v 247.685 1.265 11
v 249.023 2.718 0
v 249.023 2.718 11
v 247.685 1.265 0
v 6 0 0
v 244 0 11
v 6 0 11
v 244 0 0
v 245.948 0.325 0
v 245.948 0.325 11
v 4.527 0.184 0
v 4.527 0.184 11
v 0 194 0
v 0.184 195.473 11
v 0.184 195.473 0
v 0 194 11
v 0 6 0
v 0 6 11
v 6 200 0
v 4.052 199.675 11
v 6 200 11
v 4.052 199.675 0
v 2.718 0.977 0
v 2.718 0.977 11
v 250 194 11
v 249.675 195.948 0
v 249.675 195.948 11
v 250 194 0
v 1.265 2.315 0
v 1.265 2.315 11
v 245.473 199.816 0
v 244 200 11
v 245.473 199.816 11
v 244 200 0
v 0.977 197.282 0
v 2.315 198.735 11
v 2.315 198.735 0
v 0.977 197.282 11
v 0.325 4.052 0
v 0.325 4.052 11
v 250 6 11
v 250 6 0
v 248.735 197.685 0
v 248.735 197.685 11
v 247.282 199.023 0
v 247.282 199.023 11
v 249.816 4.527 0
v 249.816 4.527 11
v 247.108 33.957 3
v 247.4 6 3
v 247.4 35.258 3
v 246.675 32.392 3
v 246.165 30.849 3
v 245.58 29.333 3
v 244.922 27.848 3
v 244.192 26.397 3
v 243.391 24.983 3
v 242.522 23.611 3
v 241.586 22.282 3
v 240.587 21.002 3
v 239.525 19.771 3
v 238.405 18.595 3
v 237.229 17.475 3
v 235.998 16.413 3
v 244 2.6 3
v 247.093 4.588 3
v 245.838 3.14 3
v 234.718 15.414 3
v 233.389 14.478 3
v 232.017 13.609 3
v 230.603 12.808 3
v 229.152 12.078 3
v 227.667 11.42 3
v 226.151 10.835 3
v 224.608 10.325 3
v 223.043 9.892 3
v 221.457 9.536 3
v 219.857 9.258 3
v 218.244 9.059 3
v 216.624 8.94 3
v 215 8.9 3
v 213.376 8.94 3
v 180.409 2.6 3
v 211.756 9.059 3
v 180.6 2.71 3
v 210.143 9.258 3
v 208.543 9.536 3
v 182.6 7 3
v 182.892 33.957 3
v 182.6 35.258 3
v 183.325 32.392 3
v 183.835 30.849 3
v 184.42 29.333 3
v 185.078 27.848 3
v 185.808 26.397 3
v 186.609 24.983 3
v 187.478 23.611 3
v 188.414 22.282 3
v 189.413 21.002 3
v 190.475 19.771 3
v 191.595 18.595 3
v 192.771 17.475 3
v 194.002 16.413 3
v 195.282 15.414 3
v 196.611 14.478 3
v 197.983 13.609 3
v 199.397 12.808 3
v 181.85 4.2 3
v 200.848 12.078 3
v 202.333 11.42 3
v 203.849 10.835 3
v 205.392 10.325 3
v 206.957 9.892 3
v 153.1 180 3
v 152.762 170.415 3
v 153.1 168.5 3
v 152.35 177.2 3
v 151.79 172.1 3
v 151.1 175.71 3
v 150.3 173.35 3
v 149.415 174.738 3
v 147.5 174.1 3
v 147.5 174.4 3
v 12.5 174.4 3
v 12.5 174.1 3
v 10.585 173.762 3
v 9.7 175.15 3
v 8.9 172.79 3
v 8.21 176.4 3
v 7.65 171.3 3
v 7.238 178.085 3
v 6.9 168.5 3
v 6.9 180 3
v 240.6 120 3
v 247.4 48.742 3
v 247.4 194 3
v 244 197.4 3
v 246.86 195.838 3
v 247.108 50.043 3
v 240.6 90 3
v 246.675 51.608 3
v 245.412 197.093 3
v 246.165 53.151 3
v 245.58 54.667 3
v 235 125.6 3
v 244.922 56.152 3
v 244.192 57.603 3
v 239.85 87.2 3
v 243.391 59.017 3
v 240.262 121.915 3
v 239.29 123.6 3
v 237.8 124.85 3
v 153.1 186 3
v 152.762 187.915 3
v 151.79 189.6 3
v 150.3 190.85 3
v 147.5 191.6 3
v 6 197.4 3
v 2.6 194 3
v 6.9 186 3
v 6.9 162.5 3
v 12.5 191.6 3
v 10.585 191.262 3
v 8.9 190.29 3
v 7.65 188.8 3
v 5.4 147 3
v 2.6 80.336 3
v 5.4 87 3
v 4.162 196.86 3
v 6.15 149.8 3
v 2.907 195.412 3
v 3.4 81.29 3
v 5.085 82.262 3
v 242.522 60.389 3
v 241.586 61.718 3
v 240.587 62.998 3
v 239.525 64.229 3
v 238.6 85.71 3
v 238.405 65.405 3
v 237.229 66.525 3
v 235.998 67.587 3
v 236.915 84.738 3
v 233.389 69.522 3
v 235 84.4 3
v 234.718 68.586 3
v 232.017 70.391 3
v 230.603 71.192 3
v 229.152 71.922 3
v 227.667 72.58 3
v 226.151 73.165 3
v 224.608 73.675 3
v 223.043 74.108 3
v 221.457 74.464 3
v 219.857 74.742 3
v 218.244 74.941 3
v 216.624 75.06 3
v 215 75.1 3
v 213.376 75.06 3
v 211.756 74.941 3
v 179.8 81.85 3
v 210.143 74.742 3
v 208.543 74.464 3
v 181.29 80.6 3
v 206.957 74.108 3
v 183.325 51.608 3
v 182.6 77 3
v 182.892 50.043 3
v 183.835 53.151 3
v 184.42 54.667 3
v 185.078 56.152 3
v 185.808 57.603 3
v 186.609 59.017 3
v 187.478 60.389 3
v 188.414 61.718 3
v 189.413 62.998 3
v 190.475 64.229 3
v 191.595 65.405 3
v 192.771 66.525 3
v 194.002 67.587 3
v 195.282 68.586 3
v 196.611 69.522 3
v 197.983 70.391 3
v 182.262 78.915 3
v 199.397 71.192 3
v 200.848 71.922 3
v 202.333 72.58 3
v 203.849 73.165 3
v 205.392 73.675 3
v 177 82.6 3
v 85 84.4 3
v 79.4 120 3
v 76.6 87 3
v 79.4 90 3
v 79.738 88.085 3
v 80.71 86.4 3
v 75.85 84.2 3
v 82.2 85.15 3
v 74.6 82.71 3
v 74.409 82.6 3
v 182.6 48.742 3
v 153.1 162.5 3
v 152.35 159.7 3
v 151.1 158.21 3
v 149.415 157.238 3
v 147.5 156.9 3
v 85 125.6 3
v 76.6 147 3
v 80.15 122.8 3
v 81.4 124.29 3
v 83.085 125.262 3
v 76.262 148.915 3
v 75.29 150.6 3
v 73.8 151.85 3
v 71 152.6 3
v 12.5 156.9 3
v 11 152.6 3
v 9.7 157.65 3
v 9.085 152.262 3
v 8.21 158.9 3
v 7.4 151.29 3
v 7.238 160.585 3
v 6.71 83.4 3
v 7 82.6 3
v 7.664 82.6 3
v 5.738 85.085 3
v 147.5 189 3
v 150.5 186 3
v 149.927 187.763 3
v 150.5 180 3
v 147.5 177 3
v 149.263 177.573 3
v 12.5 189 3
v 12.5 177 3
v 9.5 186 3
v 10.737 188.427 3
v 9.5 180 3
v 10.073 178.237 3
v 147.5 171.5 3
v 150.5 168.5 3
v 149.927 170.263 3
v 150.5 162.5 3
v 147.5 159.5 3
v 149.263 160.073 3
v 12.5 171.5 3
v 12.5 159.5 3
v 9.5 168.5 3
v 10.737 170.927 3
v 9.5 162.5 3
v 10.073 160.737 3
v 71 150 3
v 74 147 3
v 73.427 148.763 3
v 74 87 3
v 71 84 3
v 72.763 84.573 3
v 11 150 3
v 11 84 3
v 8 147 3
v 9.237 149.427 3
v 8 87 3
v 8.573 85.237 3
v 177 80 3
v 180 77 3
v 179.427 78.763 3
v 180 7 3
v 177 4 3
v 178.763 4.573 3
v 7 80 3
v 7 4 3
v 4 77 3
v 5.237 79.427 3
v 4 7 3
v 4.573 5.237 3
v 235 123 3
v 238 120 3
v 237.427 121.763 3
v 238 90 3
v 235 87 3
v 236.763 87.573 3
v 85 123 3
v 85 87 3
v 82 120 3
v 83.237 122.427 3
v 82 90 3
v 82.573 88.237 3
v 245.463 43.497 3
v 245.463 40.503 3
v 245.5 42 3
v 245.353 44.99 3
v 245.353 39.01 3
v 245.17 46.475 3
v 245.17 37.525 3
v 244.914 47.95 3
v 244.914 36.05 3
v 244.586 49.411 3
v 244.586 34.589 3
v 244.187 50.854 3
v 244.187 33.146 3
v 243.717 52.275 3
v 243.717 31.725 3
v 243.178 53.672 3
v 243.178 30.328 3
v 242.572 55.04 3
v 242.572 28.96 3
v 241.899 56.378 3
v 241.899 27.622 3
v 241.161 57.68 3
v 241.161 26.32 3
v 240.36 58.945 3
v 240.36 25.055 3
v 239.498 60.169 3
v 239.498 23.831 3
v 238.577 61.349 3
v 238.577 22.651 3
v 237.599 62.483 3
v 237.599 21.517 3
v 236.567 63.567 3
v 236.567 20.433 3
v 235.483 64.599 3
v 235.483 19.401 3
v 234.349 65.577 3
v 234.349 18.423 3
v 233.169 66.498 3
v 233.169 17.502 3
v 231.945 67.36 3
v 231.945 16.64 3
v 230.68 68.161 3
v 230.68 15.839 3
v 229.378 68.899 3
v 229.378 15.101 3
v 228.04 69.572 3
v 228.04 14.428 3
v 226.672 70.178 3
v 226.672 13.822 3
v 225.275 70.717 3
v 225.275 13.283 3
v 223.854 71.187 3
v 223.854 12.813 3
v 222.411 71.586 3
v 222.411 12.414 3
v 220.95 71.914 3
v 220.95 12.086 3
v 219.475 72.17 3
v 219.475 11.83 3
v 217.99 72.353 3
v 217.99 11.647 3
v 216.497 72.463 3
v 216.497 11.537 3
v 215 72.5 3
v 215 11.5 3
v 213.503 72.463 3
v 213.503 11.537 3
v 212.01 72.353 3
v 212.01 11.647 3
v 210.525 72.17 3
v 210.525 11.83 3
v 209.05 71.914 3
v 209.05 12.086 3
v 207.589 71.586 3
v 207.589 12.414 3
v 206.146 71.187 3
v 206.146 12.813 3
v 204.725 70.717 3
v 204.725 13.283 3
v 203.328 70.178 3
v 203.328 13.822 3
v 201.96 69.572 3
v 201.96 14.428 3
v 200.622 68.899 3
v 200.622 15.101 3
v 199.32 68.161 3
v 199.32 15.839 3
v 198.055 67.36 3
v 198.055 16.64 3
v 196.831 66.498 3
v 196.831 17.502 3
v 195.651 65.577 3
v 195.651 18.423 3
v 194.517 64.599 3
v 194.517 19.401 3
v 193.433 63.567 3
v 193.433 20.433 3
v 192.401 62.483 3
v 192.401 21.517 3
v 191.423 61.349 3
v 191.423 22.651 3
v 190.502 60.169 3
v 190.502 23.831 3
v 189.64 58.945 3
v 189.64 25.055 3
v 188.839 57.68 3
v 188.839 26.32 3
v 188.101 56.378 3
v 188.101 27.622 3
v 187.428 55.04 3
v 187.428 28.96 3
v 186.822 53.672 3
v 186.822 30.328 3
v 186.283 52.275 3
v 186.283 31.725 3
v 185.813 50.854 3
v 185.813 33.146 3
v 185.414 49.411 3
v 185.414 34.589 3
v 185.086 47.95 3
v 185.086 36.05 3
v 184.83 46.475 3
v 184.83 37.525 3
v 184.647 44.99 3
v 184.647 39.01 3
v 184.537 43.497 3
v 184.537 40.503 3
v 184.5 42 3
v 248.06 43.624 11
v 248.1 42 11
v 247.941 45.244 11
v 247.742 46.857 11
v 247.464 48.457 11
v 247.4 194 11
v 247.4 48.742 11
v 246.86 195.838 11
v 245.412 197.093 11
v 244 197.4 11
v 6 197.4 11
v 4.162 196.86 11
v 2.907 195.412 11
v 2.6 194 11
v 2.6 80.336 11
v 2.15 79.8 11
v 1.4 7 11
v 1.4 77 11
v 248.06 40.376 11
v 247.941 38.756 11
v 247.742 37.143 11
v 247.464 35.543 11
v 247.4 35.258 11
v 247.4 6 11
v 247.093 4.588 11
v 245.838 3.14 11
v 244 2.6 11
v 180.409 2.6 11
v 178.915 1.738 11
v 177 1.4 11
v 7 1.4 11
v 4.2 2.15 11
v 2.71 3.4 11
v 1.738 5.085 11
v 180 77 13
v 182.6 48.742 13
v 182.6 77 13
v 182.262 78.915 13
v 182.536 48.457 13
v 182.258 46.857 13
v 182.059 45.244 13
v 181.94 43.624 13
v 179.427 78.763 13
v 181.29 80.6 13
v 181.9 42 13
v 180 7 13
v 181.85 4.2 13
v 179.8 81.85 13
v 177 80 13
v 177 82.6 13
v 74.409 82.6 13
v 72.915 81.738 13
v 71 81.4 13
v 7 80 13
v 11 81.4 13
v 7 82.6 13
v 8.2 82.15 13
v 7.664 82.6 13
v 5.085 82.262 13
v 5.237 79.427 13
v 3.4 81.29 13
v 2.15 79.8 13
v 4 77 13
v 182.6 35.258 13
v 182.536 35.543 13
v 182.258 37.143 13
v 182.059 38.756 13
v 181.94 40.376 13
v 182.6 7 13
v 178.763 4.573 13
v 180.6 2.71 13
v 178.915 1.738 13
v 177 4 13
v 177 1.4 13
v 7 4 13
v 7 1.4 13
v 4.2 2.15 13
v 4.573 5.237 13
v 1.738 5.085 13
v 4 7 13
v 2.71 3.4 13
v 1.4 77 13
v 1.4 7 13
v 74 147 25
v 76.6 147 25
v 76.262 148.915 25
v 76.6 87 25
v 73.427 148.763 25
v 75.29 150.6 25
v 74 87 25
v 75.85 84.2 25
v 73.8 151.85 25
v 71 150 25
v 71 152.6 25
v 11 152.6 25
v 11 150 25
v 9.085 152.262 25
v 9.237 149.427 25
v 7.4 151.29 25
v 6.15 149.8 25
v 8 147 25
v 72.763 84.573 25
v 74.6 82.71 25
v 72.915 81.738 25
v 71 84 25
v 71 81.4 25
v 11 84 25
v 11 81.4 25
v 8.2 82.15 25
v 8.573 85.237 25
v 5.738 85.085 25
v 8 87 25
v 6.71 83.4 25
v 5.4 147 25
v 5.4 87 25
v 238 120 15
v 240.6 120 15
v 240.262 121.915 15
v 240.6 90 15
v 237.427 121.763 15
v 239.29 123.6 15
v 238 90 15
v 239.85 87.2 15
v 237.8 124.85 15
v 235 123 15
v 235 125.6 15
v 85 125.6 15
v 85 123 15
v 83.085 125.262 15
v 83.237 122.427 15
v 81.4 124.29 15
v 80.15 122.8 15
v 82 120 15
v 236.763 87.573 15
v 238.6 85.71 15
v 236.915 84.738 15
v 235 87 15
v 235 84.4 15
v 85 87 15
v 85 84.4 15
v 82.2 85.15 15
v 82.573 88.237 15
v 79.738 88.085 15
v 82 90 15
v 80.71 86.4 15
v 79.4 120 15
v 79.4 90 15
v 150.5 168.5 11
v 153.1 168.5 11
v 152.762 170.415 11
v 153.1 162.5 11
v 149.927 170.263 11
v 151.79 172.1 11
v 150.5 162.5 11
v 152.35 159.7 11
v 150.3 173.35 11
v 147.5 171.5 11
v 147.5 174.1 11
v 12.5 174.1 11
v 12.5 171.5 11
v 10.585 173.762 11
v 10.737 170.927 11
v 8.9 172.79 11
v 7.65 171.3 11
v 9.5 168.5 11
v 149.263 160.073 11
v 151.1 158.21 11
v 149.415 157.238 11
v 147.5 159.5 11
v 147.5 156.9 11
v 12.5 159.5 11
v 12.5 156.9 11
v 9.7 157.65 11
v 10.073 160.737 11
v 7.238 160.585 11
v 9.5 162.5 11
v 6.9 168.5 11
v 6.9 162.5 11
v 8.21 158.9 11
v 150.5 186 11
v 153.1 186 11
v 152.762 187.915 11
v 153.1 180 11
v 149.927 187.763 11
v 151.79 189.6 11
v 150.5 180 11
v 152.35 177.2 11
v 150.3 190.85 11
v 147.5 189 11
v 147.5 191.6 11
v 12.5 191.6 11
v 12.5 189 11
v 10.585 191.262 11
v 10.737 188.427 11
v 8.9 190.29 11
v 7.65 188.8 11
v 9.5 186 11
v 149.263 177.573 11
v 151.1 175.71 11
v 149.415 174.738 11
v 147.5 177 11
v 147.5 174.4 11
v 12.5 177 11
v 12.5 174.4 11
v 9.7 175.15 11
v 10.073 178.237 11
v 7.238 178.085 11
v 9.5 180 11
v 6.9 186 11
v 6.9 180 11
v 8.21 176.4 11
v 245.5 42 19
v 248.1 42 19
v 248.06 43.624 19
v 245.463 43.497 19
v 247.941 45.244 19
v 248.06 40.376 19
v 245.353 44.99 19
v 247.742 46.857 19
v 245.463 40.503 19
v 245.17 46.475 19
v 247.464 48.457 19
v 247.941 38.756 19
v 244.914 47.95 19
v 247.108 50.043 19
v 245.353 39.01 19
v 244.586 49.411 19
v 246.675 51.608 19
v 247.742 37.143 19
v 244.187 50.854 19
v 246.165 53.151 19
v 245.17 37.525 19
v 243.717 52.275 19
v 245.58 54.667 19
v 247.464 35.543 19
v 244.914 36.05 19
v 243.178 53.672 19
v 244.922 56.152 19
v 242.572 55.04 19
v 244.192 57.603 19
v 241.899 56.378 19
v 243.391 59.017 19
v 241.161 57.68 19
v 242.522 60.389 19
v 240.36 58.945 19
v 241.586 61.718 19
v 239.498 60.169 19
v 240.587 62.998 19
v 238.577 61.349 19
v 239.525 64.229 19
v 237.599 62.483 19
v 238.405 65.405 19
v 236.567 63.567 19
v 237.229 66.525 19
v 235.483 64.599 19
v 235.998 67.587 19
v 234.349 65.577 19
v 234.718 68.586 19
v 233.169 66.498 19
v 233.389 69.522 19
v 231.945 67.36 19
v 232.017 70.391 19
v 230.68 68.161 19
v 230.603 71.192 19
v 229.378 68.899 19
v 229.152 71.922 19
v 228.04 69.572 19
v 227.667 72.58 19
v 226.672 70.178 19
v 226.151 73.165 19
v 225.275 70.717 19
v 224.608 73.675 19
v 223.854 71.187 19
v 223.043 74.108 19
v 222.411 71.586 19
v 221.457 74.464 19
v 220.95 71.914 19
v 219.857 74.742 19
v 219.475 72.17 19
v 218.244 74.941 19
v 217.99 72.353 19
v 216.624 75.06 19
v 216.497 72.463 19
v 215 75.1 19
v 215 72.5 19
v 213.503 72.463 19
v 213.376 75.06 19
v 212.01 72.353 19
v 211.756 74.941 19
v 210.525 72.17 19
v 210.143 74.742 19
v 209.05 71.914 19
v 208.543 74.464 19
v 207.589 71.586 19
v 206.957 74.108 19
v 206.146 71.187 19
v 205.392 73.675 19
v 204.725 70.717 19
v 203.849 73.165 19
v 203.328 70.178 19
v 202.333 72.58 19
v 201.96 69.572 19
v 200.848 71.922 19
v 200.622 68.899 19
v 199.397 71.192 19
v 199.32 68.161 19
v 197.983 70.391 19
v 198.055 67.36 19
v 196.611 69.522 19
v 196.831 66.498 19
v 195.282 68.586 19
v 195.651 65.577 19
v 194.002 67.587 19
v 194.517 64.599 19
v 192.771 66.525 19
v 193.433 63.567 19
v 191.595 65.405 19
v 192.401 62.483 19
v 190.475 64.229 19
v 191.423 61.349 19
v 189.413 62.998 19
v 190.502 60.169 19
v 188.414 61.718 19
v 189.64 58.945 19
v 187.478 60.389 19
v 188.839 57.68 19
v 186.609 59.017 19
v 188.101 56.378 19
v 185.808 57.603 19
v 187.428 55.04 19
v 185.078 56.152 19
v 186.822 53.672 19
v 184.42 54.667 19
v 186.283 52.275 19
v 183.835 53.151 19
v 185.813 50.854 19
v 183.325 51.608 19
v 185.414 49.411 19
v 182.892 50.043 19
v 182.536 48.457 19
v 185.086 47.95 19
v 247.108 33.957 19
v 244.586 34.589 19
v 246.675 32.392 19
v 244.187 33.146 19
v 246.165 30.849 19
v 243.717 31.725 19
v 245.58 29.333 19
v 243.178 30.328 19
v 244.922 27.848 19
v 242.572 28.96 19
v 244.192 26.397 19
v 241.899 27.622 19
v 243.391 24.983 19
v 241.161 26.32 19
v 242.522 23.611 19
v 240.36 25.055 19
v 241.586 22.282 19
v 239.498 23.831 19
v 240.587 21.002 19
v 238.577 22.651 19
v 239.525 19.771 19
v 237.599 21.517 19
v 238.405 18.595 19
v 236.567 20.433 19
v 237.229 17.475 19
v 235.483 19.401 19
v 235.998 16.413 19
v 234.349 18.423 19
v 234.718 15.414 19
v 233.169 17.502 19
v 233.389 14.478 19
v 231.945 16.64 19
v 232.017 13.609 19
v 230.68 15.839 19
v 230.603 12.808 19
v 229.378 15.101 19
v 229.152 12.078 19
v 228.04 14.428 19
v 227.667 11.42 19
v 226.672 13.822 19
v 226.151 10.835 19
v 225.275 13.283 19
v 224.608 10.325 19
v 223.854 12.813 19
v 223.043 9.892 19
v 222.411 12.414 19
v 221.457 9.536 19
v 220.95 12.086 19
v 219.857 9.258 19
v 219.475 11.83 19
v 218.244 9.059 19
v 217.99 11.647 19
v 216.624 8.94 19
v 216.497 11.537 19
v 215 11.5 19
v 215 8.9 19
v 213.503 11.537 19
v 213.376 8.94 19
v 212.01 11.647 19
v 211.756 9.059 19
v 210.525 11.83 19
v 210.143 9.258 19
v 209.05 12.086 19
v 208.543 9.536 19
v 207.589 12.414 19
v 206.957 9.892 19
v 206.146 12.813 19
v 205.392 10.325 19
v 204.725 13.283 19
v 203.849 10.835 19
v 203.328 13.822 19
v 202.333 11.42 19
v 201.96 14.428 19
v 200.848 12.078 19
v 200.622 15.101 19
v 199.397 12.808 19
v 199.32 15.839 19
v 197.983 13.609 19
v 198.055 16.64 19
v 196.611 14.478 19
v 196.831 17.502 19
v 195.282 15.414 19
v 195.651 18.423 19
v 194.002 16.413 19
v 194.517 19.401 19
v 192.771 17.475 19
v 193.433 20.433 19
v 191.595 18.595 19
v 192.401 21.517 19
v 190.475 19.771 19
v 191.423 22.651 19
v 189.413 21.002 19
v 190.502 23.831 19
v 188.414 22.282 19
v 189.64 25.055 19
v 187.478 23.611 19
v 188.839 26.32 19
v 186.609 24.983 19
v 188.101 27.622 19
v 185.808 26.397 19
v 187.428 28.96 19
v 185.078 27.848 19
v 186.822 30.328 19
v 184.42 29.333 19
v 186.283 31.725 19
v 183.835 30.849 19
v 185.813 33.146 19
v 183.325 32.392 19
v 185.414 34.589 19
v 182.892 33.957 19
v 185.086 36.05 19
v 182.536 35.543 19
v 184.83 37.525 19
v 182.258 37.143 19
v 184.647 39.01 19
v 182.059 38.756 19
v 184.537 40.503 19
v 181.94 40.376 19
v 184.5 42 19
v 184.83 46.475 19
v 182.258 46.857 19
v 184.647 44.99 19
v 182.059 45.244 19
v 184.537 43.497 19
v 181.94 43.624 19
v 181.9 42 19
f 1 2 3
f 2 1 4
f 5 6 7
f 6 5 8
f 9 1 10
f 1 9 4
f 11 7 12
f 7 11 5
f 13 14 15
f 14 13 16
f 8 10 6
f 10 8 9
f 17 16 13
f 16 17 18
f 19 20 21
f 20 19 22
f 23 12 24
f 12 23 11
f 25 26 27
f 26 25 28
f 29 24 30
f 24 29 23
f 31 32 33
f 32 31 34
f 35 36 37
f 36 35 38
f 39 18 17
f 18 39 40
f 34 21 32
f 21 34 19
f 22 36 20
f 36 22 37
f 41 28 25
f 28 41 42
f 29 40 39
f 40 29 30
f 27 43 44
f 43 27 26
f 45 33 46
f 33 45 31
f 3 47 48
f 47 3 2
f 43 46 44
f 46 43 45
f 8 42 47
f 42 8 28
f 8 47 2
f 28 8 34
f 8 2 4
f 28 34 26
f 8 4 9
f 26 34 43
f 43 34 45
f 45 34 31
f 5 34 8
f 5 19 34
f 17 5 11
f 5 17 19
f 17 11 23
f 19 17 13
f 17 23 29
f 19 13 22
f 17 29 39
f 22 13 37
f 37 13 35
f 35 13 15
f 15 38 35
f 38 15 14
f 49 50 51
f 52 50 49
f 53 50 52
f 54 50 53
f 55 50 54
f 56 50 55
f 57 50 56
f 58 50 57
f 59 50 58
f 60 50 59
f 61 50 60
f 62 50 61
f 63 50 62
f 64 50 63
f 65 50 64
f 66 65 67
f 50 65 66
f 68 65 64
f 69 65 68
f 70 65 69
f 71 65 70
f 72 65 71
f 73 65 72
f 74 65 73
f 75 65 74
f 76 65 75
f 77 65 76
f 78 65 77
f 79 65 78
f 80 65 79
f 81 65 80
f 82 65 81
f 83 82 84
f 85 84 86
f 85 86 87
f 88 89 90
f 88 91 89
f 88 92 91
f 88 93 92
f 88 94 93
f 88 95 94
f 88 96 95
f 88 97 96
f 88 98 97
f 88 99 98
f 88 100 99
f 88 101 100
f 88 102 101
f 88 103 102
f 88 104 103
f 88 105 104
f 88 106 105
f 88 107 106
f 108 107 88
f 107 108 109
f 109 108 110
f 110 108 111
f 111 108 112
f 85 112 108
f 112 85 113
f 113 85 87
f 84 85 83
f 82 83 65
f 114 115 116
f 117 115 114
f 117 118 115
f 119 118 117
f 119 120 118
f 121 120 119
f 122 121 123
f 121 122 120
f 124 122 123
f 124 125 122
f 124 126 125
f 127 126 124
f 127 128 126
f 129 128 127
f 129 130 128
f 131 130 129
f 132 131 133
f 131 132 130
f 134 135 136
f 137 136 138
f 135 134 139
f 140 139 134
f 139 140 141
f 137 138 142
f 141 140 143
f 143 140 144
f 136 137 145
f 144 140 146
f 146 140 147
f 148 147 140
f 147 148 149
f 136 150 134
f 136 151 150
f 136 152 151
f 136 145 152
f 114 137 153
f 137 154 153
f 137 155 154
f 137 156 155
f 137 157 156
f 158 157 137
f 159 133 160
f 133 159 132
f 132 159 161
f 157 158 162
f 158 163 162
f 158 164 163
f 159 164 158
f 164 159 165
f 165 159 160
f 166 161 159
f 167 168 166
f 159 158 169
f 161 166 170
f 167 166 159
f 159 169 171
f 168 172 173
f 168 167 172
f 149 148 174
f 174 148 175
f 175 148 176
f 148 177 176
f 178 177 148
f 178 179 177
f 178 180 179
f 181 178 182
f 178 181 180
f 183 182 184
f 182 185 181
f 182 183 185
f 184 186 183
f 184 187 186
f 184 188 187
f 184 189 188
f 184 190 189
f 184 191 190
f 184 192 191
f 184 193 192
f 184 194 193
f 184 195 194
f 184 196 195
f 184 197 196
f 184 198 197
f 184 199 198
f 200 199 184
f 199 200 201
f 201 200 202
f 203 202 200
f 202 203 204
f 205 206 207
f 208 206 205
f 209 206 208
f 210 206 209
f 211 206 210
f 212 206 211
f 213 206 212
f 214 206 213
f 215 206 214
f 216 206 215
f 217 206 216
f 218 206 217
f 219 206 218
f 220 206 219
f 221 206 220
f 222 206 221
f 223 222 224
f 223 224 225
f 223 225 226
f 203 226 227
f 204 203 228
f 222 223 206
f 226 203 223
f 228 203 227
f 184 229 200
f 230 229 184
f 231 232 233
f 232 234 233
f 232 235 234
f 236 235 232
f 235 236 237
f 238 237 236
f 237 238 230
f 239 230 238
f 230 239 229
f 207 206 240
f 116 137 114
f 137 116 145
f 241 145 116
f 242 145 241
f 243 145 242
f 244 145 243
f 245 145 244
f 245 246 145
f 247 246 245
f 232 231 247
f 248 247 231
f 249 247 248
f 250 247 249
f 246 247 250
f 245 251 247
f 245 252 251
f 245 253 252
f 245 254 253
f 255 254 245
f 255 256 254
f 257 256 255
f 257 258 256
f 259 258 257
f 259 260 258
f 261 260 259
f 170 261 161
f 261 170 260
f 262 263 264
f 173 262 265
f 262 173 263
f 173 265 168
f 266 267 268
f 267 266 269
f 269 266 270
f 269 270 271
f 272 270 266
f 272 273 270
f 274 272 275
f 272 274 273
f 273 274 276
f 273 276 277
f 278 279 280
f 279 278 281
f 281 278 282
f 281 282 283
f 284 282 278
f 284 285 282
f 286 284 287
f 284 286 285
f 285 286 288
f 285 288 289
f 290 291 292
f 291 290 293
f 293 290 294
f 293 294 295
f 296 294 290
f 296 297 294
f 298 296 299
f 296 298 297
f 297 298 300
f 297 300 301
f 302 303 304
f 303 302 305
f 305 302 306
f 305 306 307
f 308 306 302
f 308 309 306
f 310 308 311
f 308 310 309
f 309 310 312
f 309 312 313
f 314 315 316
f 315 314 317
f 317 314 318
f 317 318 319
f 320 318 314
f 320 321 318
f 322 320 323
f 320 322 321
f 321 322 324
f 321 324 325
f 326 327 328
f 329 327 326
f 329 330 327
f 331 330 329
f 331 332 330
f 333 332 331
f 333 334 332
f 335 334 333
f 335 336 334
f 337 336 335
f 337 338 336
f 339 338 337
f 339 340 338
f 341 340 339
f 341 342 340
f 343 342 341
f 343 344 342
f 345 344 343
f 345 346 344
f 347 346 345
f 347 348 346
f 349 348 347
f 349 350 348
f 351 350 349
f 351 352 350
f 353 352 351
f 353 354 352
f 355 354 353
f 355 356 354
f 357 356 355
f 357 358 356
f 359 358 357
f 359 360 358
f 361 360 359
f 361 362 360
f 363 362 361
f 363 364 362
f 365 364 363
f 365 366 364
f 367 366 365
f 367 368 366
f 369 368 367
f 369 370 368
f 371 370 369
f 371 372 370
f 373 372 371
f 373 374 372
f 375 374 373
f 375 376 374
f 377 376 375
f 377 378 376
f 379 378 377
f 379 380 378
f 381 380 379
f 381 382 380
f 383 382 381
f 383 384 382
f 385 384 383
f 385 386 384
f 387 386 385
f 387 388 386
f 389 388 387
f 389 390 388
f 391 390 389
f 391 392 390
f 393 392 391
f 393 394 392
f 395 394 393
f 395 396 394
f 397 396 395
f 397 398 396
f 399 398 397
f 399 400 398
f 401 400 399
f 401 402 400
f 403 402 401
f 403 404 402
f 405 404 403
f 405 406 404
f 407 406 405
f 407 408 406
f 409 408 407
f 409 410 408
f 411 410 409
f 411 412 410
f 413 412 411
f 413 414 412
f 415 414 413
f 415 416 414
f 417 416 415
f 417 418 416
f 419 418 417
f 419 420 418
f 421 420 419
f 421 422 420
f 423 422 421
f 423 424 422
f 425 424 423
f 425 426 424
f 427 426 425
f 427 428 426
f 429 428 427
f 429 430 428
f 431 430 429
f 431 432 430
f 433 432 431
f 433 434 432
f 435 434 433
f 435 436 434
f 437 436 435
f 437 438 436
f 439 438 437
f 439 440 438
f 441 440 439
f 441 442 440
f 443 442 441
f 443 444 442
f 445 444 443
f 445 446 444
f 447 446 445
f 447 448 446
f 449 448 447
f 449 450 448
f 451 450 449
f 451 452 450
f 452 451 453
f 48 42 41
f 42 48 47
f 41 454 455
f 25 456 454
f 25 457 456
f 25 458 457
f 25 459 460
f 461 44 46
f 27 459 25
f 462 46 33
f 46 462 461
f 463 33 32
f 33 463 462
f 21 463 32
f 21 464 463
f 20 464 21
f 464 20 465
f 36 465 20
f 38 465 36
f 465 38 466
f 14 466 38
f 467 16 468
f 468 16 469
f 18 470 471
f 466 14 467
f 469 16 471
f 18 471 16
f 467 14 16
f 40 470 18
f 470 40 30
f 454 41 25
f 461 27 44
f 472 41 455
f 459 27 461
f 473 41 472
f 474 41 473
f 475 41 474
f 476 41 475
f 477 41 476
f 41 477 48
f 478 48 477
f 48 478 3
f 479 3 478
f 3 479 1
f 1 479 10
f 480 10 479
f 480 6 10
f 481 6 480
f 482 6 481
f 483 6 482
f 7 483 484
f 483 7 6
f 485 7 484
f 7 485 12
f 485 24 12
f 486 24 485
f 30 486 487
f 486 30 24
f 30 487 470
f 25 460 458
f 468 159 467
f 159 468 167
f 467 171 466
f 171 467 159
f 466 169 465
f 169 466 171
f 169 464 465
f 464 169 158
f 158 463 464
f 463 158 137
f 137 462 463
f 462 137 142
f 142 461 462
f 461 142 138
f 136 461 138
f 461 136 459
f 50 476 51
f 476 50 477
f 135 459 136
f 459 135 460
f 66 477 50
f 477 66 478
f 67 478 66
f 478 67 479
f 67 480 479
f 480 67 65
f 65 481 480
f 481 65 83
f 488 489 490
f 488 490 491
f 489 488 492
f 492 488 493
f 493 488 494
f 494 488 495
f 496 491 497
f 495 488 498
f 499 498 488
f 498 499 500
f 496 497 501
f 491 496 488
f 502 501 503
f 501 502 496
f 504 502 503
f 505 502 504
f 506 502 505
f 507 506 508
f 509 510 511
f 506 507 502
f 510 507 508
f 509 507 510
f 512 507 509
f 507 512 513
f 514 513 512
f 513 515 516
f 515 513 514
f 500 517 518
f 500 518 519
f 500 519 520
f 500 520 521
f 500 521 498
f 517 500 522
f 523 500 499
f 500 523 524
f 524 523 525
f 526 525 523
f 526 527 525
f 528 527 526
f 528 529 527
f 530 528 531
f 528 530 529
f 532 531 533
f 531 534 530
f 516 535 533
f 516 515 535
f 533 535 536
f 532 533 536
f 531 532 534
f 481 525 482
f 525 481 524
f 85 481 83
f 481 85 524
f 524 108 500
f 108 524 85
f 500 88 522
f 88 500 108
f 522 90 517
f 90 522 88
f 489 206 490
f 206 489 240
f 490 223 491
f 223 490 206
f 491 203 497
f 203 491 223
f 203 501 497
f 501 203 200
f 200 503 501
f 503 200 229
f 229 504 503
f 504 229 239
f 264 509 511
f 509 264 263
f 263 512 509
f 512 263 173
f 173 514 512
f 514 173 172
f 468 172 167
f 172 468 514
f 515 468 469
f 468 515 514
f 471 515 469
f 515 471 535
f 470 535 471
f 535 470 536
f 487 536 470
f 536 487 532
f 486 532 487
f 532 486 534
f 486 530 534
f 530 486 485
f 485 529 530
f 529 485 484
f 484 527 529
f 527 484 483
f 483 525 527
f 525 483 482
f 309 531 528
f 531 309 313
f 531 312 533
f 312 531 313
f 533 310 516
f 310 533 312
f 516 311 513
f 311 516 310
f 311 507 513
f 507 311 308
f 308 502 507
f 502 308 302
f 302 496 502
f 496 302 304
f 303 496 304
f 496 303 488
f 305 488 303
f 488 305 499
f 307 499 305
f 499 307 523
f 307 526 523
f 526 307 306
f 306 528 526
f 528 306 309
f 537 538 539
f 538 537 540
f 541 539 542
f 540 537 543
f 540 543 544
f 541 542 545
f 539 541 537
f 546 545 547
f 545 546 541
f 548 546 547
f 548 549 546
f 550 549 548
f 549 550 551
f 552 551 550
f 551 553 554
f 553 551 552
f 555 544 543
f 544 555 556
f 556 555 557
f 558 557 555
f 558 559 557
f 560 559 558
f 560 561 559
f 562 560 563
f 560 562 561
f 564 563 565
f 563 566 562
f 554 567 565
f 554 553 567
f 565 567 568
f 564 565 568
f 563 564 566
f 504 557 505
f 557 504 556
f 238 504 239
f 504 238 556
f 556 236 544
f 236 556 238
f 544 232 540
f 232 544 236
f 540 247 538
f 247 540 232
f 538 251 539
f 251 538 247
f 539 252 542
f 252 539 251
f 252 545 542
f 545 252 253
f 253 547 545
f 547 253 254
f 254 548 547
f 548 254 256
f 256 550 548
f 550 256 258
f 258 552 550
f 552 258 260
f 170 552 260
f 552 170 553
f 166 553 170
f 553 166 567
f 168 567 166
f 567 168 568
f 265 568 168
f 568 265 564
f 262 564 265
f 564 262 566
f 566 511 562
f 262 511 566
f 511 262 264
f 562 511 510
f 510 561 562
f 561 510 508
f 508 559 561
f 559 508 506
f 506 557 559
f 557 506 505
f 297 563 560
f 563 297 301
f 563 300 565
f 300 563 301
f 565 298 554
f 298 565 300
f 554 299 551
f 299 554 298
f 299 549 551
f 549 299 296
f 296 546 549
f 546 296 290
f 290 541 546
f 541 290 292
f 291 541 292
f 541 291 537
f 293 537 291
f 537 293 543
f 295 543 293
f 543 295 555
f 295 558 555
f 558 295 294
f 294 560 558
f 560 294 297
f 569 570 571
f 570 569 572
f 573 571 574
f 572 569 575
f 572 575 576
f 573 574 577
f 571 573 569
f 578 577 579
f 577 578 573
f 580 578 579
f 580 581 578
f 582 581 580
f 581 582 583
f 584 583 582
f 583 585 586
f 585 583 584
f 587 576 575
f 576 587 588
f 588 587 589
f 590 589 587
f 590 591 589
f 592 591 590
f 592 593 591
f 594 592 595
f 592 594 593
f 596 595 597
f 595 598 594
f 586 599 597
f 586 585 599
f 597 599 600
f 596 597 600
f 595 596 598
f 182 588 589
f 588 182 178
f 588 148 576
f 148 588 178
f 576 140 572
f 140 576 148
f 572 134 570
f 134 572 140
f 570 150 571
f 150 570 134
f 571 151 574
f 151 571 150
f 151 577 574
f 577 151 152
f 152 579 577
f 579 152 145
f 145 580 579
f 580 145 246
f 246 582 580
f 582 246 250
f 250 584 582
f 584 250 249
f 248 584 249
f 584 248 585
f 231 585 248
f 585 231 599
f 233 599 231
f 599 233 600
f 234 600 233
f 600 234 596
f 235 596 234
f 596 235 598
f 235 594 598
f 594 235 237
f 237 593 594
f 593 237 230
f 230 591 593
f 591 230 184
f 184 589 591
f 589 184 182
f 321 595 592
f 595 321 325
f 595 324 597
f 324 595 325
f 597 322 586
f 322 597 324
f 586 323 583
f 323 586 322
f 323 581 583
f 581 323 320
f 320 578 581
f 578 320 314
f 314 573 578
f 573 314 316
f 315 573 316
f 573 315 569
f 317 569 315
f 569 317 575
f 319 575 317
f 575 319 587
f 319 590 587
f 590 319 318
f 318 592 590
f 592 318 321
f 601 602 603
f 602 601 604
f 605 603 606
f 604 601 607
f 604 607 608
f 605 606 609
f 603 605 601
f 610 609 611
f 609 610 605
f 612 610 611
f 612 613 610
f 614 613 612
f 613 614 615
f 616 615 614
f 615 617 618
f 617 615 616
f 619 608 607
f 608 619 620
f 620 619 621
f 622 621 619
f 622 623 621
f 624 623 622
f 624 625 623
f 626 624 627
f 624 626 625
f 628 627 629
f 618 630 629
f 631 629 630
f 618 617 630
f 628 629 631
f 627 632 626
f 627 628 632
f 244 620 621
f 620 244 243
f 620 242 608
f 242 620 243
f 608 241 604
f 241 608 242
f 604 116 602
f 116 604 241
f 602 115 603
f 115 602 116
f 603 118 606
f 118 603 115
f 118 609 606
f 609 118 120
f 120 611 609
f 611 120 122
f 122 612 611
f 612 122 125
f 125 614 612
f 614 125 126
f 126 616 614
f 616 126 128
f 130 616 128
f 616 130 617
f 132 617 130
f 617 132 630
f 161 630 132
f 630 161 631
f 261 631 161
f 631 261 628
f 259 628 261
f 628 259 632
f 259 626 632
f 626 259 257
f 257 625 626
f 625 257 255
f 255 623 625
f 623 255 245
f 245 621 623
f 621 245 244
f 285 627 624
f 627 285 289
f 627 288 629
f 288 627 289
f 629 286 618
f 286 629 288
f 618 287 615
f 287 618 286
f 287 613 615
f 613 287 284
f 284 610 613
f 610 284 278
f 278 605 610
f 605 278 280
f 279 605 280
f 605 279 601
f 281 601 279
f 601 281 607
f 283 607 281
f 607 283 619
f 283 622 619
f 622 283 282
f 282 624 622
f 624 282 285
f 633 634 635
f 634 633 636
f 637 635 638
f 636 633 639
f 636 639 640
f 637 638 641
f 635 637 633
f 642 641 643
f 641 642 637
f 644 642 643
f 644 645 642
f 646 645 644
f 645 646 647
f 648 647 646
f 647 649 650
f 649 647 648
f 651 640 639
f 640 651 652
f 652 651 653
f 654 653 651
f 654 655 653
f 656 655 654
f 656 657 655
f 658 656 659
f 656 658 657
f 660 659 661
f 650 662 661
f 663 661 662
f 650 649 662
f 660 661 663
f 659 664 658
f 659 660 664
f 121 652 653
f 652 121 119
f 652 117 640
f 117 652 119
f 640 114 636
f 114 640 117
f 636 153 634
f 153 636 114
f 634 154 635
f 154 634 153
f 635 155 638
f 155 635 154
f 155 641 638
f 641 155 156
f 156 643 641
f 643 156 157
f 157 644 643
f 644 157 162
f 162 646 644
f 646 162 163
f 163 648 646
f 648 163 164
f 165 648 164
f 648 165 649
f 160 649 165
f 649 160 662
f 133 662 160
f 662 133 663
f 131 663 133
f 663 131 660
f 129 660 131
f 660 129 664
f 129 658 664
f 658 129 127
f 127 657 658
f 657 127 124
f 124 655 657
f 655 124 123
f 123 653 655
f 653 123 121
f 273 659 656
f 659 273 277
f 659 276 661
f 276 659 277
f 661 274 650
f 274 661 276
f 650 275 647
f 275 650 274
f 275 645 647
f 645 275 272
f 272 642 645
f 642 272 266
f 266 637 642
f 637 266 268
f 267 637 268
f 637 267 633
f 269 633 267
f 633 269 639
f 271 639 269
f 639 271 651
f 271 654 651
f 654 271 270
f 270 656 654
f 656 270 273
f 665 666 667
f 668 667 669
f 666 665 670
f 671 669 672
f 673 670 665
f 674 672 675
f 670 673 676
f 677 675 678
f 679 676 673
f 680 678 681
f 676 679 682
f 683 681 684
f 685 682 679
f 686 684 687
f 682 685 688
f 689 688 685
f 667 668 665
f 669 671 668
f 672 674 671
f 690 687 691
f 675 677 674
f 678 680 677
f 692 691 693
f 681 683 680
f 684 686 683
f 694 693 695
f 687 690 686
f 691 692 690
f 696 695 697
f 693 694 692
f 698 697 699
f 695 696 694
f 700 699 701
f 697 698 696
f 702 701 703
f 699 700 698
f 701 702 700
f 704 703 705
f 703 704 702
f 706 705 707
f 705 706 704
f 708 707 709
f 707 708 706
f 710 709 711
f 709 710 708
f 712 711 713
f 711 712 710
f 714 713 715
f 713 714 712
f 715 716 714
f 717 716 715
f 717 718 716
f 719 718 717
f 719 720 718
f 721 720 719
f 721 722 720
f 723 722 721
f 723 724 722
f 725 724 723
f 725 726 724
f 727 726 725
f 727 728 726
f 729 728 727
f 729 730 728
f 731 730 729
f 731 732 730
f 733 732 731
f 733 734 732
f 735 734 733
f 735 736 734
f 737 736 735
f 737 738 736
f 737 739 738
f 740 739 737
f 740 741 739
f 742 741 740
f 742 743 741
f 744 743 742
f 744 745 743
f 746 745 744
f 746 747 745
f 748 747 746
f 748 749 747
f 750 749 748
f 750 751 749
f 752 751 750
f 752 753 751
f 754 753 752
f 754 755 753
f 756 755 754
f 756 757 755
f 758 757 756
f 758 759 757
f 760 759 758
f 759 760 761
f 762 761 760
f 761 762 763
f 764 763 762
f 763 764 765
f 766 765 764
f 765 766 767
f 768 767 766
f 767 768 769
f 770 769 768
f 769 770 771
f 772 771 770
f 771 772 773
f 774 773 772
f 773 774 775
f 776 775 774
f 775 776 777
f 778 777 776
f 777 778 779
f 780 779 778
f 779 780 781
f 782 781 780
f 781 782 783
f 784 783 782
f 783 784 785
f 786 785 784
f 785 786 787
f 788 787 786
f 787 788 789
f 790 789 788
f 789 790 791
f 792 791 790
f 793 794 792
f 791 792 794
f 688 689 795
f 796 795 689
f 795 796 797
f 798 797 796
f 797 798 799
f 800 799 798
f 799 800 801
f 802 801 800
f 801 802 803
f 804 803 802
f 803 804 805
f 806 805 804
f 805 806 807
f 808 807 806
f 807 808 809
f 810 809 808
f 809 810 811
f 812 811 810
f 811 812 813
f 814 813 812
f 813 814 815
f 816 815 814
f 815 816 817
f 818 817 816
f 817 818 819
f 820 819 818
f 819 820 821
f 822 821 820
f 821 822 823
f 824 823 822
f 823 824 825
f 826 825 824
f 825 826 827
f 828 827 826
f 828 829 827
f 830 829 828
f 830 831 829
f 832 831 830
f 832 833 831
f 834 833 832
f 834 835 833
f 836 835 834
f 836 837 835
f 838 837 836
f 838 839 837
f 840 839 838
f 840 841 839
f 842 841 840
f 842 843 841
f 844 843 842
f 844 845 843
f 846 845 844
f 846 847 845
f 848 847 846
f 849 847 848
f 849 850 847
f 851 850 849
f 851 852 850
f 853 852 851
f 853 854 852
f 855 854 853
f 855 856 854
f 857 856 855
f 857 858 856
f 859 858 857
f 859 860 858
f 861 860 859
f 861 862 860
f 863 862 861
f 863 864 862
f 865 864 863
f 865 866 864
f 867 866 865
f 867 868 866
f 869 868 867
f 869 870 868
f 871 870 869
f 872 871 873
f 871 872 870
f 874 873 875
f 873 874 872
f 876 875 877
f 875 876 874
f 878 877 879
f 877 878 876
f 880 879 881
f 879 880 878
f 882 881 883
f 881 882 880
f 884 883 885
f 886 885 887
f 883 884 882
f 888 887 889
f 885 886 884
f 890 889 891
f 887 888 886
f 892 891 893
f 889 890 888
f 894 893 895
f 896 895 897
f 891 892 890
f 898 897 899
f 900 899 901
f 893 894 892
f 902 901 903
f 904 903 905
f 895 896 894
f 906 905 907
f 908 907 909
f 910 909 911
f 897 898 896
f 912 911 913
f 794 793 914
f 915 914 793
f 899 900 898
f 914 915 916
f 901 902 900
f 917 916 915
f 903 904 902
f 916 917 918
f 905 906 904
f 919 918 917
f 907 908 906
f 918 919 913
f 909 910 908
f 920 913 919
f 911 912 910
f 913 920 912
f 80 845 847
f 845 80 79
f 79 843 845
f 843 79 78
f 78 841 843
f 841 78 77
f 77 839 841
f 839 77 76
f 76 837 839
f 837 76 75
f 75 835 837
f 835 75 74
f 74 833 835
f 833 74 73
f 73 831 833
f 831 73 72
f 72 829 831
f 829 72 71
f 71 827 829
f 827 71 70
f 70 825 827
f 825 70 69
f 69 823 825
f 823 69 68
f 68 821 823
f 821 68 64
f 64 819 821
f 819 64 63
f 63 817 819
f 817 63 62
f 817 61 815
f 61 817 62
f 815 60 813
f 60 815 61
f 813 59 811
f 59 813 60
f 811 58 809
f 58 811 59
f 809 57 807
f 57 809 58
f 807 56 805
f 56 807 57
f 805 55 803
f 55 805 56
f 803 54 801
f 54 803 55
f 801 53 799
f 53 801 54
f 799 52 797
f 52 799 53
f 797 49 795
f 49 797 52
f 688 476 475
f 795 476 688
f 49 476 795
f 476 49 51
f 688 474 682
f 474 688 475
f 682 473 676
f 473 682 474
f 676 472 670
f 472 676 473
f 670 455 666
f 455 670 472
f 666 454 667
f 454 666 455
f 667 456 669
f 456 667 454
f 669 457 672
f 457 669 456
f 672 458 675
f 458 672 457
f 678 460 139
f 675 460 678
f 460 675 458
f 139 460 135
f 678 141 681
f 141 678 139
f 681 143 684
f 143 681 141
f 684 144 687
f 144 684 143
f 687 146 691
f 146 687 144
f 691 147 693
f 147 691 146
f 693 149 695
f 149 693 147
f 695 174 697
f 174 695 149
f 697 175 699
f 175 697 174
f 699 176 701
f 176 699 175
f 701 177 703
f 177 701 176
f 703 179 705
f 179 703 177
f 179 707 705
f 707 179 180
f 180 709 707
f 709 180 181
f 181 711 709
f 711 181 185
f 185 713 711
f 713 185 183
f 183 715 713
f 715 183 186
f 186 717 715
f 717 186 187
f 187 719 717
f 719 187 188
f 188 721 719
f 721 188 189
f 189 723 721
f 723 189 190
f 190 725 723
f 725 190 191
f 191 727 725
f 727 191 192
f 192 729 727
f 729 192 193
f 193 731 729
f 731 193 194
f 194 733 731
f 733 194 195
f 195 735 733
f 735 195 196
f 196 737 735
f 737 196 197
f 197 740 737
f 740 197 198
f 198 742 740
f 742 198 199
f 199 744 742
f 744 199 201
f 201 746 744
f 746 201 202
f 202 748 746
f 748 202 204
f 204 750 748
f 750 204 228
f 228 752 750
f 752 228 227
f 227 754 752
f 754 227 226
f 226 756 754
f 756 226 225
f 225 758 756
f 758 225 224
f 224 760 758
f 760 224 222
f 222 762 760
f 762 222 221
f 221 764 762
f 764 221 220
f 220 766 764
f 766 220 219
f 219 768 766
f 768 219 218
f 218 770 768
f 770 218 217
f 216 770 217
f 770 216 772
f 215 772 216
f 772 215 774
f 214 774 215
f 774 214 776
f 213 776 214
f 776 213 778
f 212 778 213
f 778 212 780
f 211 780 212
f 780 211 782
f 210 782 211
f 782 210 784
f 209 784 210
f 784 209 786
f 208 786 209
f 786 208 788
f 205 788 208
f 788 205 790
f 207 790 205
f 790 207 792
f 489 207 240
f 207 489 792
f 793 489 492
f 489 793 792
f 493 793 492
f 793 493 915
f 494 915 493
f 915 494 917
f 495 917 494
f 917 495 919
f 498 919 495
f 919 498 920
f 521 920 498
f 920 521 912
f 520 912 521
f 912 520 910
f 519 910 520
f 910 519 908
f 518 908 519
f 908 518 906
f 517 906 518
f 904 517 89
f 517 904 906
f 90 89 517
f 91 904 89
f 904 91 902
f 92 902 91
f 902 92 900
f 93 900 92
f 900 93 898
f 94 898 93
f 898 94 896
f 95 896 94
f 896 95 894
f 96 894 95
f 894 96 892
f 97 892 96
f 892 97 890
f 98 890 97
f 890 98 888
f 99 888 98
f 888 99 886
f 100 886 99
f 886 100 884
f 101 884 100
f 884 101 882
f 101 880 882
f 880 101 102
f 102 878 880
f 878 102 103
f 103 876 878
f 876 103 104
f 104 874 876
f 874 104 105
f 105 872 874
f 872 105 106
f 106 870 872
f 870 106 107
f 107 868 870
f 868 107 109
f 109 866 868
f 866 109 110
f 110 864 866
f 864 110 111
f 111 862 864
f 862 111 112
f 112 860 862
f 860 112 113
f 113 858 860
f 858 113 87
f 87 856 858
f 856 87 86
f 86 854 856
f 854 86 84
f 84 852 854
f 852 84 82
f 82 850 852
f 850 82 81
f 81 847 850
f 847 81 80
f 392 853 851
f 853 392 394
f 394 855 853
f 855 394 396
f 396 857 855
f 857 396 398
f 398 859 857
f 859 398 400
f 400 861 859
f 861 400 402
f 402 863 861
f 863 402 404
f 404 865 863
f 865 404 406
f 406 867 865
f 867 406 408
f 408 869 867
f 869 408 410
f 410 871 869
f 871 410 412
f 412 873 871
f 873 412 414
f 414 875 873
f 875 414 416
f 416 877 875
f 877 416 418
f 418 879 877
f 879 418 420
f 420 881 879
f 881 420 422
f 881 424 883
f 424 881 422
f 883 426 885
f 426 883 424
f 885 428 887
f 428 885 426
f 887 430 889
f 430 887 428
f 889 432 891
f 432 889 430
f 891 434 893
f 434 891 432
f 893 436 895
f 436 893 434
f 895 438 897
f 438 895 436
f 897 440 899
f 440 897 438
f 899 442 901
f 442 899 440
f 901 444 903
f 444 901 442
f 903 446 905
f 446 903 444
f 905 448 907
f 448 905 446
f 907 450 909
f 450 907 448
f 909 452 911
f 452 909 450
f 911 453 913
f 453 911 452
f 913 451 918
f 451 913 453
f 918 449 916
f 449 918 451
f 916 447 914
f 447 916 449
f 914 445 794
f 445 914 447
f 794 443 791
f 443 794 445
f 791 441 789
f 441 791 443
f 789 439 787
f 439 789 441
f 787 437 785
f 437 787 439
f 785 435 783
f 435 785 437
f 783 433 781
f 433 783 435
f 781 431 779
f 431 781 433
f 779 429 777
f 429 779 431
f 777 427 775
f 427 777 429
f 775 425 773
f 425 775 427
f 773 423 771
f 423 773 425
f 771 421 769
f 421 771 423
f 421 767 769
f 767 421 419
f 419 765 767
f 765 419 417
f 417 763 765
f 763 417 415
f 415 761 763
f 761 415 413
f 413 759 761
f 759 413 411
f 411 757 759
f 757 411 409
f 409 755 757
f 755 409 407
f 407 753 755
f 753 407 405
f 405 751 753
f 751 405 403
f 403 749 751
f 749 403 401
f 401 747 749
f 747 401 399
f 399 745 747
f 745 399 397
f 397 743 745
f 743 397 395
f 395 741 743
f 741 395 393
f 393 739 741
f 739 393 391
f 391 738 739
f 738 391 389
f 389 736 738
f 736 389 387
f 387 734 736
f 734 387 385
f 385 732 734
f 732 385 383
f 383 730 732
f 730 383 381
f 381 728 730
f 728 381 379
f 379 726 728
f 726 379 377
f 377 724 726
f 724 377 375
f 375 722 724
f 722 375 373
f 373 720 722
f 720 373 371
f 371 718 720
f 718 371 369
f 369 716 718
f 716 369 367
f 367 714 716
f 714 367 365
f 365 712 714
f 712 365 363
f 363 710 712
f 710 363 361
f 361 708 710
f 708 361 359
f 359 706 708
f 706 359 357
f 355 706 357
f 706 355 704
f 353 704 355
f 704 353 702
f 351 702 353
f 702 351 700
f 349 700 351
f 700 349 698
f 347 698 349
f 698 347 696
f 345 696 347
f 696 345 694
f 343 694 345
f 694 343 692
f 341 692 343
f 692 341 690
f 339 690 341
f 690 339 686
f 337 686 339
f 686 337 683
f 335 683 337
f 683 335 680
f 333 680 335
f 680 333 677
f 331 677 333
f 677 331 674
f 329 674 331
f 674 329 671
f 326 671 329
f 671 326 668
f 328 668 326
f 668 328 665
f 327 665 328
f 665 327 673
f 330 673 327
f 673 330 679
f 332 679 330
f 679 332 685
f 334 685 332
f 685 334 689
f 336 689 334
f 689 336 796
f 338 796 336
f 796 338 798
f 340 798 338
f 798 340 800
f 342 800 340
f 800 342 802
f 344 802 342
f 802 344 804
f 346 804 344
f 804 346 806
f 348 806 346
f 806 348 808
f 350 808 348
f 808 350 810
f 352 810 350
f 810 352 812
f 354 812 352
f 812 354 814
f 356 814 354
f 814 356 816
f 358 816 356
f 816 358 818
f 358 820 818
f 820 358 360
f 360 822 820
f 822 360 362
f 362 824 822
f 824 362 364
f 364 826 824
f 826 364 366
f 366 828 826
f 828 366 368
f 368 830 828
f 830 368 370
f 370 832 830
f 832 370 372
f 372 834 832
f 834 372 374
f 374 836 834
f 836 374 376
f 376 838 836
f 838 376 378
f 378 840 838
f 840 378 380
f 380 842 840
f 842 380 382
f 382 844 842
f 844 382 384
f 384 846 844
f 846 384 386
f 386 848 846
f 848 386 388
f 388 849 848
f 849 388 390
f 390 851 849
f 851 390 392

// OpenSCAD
// =============================================================================
// idea-006 桌面工具收纳盘 —— 家里常用工具一盘子收好（参数化）
//
// 结构（一句）：一块圆角底板 + 每个工具位一圈立壁（方件用圆角矩形、圆件用圆环），
// 工具坐在底板上、被立壁围住；四周再起一道矮唇，整体像一只浅盘。
// **不是**一整块实心砖挖洞——那样 250x200 的盘子要 1.2 升料（check.py 的材料预算会拦下）。
//
// 参数化规矩（这个目录的约定）：
//   - 尺寸只写在本文件：结构参数在「参数」段，工具/槽位在两张表里
//   - 表格列固定，Python 侧（model.py / check.py）按列解析并逐条对账：
//       方槽 rect_rows : [名字, 中心x, 中心y, 工具长, 工具宽, 工具厚, 槽长, 槽宽, 槽深]
//       圆槽 bore_rows : [名字, 中心x, 中心y, 工具直径, 工具厚, 槽直径, 槽深]
//     名字只是标签（中文原样写，方便主人认），几何只看数字
//   - 槽深 = 立壁高出底板的高度；槽尺寸 = 工具尺寸 + 2*gap，check.py 逐条核对
//
// 硬约束：单件外廓 ≤250x250x250mm（主人：打印机长宽高都在 25cm 以内）
// 打印注意：只有竖直壁与水平面，没有悬垂 → 免支撑；底板 3mm 平铺不翘边
// 改动入口：只改下面「参数」与两张表，几何与派生量全跟着走。
// =============================================================================

// ---------- 参数：结构 ----------
tray_w     = 250;    // 外廓长（X）
tray_d     = 200;    // 外廓宽（Y）
tray_h     = 25;     // 总高（Z）= floor_t + 最深槽深，check.py 会对账
floor_t    = 3;      // 底板厚（槽底剩料厚度）
wall_t     = 2.6;    // 每个工具位的立壁厚（0.4 喷嘴 6 条线）
rim_h      = 8;      // 四周矮唇高度（防滚落；比最深槽矮，省料）
gap        = 0.5;    // 槽与工具的单边间隙（0.4 喷嘴起步 0.5）
corner_r   = 6;      // 外轮廓圆角
pocket_r   = 3;      // 方槽内圆角
wall_margin= 4;      // 槽到外轮廓最小距离（保证外圈有肉）

// ---------- 数据：方槽 [名字, 中心x, 中心y, 工具长, 工具宽, 工具厚, 槽长, 槽宽, 槽深] ----------
rect_rows = [
  ["剪刀",        92,  42,   175, 75, 12, 176,  76, 10],
  ["卷尺 5m",     41, 117,    65, 65, 26,  66,  66, 22],
  ["美工刀",     160, 105,   155, 35, 14, 156,  36, 12],
  ["记号笔 A",    80, 165.5, 140, 11, 11, 141,  12,  8],
  ["记号笔 B",    80, 183,   140, 11, 11, 141,  12,  8],
];

// ---------- 数据：圆槽 [名字, 中心x, 中心y, 工具直径, 工具厚, 槽直径, 槽深] ----------
bore_rows = [
  ["胶带卷",     215,  42,    60, 20, 61, 16],
];

// ---------- 几何（别动，除非要改结构） ----------
module rounded_rect(w, d, r) {
  offset(r = r) square([w - 2 * r, d - 2 * r], center = true);
}

// 底板 + 四周矮唇
module plate() {
  linear_extrude(floor_t) rounded_rect(tray_w, tray_d, corner_r);
  translate([0, 0, floor_t])
    linear_extrude(rim_h)
      difference() {
        rounded_rect(tray_w, tray_d, corner_r);
        rounded_rect(tray_w - 2 * wall_t, tray_d - 2 * wall_t, corner_r - wall_t);
      }
}

// 每个工具位一圈立壁
module wells() {
  for (row = rect_rows) {
    translate([row[1], row[2], floor_t])
      linear_extrude(row[8])
        difference() {
          rounded_rect(row[6] + 2 * wall_t, row[7] + 2 * wall_t, pocket_r + wall_t);
          rounded_rect(row[6], row[7], pocket_r);
        }
  }
  for (row = bore_rows) {
    translate([row[1], row[2], floor_t])
      linear_extrude(row[6])
        difference() {
          circle(d = row[5] + 2 * wall_t, $fn = 128);
          circle(d = row[5], $fn = 128);
        }
  }
}

// 坐标约定：表格里的中心坐标以**盘子左下角**为原点；底板/矮唇按中心对齐建，
// 所以这里整体挪到角坐标系，两套数字才对得上（包围盒由 check.py 对账）
union() {
  translate([tray_w / 2, tray_d / 2]) {
    plate();
  }
  wells();
}
